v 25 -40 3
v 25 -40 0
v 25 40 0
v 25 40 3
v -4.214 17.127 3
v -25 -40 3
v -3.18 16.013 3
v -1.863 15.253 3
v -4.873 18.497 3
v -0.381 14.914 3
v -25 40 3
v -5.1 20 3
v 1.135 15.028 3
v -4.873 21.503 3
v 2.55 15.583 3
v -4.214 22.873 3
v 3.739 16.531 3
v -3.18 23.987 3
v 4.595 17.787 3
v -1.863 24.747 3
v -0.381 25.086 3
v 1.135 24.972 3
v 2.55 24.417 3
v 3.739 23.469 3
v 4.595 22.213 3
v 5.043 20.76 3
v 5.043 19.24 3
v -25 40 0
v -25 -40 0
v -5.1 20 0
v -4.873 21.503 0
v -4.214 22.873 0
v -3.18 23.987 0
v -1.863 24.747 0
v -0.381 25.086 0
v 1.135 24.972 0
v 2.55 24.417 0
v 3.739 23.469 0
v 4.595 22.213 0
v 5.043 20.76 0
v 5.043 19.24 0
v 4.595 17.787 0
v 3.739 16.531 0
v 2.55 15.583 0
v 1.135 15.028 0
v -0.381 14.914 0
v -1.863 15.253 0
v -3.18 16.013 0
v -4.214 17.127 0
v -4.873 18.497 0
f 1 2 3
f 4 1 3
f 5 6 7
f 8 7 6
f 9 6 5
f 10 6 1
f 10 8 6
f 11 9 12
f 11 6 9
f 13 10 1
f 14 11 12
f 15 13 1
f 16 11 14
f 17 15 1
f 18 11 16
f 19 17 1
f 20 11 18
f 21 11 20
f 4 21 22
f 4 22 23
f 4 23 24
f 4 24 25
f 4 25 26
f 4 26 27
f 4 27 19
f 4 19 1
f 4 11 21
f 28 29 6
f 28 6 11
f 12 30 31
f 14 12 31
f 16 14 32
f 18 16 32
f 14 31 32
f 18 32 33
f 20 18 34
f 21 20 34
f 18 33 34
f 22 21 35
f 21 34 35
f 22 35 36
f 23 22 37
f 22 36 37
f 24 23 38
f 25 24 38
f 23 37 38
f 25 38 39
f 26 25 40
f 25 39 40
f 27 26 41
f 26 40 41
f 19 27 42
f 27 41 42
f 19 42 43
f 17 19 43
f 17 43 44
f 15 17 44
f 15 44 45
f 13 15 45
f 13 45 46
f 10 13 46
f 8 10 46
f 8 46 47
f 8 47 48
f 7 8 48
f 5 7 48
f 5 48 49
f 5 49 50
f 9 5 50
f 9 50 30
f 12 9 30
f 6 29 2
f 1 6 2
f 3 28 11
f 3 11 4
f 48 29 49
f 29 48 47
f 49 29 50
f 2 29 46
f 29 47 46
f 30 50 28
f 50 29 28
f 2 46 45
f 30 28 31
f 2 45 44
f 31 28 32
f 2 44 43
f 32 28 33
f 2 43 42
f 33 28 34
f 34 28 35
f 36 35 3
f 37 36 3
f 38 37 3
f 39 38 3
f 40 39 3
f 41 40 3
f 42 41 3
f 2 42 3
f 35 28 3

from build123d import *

# Parameters (mm, degrees)
SZKIC1_W                    = 50
SZKIC1_H                    = 80
DODANIE_WYCI_GNI_CIE1_DEPTH = 3
OTW_R_GWINTOWANY_M121_D     = 10.2
OTW_R_GWINTOWANY_M121_DEPTH = 32.75
OTW_R_GWINTOWANY_M121_TIP   = 3.064389157


with BuildPart() as part:
    # Szkic1 → Dodanie-wyciągnięcie1 (new body)
    with BuildSketch(Plane.XY):
        Rectangle(SZKIC1_W, SZKIC1_H)
    extrude(amount=DODANIE_WYCI_GNI_CIE1_DEPTH)

    # Otwór gwintowany M121
    with Locations(Plane.XY.offset(3)):
        with Locations((0, 20)):
            Hole(OTW_R_GWINTOWANY_M121_D / 2, depth=OTW_R_GWINTOWANY_M121_DEPTH)
            with Locations((0, 0, -(OTW_R_GWINTOWANY_M121_DEPTH + OTW_R_GWINTOWANY_M121_TIP / 2))):  # 118° drill point
                Cone(0, OTW_R_GWINTOWANY_M121_D / 2, OTW_R_GWINTOWANY_M121_TIP, mode=Mode.SUBTRACT)


solid = part.part
